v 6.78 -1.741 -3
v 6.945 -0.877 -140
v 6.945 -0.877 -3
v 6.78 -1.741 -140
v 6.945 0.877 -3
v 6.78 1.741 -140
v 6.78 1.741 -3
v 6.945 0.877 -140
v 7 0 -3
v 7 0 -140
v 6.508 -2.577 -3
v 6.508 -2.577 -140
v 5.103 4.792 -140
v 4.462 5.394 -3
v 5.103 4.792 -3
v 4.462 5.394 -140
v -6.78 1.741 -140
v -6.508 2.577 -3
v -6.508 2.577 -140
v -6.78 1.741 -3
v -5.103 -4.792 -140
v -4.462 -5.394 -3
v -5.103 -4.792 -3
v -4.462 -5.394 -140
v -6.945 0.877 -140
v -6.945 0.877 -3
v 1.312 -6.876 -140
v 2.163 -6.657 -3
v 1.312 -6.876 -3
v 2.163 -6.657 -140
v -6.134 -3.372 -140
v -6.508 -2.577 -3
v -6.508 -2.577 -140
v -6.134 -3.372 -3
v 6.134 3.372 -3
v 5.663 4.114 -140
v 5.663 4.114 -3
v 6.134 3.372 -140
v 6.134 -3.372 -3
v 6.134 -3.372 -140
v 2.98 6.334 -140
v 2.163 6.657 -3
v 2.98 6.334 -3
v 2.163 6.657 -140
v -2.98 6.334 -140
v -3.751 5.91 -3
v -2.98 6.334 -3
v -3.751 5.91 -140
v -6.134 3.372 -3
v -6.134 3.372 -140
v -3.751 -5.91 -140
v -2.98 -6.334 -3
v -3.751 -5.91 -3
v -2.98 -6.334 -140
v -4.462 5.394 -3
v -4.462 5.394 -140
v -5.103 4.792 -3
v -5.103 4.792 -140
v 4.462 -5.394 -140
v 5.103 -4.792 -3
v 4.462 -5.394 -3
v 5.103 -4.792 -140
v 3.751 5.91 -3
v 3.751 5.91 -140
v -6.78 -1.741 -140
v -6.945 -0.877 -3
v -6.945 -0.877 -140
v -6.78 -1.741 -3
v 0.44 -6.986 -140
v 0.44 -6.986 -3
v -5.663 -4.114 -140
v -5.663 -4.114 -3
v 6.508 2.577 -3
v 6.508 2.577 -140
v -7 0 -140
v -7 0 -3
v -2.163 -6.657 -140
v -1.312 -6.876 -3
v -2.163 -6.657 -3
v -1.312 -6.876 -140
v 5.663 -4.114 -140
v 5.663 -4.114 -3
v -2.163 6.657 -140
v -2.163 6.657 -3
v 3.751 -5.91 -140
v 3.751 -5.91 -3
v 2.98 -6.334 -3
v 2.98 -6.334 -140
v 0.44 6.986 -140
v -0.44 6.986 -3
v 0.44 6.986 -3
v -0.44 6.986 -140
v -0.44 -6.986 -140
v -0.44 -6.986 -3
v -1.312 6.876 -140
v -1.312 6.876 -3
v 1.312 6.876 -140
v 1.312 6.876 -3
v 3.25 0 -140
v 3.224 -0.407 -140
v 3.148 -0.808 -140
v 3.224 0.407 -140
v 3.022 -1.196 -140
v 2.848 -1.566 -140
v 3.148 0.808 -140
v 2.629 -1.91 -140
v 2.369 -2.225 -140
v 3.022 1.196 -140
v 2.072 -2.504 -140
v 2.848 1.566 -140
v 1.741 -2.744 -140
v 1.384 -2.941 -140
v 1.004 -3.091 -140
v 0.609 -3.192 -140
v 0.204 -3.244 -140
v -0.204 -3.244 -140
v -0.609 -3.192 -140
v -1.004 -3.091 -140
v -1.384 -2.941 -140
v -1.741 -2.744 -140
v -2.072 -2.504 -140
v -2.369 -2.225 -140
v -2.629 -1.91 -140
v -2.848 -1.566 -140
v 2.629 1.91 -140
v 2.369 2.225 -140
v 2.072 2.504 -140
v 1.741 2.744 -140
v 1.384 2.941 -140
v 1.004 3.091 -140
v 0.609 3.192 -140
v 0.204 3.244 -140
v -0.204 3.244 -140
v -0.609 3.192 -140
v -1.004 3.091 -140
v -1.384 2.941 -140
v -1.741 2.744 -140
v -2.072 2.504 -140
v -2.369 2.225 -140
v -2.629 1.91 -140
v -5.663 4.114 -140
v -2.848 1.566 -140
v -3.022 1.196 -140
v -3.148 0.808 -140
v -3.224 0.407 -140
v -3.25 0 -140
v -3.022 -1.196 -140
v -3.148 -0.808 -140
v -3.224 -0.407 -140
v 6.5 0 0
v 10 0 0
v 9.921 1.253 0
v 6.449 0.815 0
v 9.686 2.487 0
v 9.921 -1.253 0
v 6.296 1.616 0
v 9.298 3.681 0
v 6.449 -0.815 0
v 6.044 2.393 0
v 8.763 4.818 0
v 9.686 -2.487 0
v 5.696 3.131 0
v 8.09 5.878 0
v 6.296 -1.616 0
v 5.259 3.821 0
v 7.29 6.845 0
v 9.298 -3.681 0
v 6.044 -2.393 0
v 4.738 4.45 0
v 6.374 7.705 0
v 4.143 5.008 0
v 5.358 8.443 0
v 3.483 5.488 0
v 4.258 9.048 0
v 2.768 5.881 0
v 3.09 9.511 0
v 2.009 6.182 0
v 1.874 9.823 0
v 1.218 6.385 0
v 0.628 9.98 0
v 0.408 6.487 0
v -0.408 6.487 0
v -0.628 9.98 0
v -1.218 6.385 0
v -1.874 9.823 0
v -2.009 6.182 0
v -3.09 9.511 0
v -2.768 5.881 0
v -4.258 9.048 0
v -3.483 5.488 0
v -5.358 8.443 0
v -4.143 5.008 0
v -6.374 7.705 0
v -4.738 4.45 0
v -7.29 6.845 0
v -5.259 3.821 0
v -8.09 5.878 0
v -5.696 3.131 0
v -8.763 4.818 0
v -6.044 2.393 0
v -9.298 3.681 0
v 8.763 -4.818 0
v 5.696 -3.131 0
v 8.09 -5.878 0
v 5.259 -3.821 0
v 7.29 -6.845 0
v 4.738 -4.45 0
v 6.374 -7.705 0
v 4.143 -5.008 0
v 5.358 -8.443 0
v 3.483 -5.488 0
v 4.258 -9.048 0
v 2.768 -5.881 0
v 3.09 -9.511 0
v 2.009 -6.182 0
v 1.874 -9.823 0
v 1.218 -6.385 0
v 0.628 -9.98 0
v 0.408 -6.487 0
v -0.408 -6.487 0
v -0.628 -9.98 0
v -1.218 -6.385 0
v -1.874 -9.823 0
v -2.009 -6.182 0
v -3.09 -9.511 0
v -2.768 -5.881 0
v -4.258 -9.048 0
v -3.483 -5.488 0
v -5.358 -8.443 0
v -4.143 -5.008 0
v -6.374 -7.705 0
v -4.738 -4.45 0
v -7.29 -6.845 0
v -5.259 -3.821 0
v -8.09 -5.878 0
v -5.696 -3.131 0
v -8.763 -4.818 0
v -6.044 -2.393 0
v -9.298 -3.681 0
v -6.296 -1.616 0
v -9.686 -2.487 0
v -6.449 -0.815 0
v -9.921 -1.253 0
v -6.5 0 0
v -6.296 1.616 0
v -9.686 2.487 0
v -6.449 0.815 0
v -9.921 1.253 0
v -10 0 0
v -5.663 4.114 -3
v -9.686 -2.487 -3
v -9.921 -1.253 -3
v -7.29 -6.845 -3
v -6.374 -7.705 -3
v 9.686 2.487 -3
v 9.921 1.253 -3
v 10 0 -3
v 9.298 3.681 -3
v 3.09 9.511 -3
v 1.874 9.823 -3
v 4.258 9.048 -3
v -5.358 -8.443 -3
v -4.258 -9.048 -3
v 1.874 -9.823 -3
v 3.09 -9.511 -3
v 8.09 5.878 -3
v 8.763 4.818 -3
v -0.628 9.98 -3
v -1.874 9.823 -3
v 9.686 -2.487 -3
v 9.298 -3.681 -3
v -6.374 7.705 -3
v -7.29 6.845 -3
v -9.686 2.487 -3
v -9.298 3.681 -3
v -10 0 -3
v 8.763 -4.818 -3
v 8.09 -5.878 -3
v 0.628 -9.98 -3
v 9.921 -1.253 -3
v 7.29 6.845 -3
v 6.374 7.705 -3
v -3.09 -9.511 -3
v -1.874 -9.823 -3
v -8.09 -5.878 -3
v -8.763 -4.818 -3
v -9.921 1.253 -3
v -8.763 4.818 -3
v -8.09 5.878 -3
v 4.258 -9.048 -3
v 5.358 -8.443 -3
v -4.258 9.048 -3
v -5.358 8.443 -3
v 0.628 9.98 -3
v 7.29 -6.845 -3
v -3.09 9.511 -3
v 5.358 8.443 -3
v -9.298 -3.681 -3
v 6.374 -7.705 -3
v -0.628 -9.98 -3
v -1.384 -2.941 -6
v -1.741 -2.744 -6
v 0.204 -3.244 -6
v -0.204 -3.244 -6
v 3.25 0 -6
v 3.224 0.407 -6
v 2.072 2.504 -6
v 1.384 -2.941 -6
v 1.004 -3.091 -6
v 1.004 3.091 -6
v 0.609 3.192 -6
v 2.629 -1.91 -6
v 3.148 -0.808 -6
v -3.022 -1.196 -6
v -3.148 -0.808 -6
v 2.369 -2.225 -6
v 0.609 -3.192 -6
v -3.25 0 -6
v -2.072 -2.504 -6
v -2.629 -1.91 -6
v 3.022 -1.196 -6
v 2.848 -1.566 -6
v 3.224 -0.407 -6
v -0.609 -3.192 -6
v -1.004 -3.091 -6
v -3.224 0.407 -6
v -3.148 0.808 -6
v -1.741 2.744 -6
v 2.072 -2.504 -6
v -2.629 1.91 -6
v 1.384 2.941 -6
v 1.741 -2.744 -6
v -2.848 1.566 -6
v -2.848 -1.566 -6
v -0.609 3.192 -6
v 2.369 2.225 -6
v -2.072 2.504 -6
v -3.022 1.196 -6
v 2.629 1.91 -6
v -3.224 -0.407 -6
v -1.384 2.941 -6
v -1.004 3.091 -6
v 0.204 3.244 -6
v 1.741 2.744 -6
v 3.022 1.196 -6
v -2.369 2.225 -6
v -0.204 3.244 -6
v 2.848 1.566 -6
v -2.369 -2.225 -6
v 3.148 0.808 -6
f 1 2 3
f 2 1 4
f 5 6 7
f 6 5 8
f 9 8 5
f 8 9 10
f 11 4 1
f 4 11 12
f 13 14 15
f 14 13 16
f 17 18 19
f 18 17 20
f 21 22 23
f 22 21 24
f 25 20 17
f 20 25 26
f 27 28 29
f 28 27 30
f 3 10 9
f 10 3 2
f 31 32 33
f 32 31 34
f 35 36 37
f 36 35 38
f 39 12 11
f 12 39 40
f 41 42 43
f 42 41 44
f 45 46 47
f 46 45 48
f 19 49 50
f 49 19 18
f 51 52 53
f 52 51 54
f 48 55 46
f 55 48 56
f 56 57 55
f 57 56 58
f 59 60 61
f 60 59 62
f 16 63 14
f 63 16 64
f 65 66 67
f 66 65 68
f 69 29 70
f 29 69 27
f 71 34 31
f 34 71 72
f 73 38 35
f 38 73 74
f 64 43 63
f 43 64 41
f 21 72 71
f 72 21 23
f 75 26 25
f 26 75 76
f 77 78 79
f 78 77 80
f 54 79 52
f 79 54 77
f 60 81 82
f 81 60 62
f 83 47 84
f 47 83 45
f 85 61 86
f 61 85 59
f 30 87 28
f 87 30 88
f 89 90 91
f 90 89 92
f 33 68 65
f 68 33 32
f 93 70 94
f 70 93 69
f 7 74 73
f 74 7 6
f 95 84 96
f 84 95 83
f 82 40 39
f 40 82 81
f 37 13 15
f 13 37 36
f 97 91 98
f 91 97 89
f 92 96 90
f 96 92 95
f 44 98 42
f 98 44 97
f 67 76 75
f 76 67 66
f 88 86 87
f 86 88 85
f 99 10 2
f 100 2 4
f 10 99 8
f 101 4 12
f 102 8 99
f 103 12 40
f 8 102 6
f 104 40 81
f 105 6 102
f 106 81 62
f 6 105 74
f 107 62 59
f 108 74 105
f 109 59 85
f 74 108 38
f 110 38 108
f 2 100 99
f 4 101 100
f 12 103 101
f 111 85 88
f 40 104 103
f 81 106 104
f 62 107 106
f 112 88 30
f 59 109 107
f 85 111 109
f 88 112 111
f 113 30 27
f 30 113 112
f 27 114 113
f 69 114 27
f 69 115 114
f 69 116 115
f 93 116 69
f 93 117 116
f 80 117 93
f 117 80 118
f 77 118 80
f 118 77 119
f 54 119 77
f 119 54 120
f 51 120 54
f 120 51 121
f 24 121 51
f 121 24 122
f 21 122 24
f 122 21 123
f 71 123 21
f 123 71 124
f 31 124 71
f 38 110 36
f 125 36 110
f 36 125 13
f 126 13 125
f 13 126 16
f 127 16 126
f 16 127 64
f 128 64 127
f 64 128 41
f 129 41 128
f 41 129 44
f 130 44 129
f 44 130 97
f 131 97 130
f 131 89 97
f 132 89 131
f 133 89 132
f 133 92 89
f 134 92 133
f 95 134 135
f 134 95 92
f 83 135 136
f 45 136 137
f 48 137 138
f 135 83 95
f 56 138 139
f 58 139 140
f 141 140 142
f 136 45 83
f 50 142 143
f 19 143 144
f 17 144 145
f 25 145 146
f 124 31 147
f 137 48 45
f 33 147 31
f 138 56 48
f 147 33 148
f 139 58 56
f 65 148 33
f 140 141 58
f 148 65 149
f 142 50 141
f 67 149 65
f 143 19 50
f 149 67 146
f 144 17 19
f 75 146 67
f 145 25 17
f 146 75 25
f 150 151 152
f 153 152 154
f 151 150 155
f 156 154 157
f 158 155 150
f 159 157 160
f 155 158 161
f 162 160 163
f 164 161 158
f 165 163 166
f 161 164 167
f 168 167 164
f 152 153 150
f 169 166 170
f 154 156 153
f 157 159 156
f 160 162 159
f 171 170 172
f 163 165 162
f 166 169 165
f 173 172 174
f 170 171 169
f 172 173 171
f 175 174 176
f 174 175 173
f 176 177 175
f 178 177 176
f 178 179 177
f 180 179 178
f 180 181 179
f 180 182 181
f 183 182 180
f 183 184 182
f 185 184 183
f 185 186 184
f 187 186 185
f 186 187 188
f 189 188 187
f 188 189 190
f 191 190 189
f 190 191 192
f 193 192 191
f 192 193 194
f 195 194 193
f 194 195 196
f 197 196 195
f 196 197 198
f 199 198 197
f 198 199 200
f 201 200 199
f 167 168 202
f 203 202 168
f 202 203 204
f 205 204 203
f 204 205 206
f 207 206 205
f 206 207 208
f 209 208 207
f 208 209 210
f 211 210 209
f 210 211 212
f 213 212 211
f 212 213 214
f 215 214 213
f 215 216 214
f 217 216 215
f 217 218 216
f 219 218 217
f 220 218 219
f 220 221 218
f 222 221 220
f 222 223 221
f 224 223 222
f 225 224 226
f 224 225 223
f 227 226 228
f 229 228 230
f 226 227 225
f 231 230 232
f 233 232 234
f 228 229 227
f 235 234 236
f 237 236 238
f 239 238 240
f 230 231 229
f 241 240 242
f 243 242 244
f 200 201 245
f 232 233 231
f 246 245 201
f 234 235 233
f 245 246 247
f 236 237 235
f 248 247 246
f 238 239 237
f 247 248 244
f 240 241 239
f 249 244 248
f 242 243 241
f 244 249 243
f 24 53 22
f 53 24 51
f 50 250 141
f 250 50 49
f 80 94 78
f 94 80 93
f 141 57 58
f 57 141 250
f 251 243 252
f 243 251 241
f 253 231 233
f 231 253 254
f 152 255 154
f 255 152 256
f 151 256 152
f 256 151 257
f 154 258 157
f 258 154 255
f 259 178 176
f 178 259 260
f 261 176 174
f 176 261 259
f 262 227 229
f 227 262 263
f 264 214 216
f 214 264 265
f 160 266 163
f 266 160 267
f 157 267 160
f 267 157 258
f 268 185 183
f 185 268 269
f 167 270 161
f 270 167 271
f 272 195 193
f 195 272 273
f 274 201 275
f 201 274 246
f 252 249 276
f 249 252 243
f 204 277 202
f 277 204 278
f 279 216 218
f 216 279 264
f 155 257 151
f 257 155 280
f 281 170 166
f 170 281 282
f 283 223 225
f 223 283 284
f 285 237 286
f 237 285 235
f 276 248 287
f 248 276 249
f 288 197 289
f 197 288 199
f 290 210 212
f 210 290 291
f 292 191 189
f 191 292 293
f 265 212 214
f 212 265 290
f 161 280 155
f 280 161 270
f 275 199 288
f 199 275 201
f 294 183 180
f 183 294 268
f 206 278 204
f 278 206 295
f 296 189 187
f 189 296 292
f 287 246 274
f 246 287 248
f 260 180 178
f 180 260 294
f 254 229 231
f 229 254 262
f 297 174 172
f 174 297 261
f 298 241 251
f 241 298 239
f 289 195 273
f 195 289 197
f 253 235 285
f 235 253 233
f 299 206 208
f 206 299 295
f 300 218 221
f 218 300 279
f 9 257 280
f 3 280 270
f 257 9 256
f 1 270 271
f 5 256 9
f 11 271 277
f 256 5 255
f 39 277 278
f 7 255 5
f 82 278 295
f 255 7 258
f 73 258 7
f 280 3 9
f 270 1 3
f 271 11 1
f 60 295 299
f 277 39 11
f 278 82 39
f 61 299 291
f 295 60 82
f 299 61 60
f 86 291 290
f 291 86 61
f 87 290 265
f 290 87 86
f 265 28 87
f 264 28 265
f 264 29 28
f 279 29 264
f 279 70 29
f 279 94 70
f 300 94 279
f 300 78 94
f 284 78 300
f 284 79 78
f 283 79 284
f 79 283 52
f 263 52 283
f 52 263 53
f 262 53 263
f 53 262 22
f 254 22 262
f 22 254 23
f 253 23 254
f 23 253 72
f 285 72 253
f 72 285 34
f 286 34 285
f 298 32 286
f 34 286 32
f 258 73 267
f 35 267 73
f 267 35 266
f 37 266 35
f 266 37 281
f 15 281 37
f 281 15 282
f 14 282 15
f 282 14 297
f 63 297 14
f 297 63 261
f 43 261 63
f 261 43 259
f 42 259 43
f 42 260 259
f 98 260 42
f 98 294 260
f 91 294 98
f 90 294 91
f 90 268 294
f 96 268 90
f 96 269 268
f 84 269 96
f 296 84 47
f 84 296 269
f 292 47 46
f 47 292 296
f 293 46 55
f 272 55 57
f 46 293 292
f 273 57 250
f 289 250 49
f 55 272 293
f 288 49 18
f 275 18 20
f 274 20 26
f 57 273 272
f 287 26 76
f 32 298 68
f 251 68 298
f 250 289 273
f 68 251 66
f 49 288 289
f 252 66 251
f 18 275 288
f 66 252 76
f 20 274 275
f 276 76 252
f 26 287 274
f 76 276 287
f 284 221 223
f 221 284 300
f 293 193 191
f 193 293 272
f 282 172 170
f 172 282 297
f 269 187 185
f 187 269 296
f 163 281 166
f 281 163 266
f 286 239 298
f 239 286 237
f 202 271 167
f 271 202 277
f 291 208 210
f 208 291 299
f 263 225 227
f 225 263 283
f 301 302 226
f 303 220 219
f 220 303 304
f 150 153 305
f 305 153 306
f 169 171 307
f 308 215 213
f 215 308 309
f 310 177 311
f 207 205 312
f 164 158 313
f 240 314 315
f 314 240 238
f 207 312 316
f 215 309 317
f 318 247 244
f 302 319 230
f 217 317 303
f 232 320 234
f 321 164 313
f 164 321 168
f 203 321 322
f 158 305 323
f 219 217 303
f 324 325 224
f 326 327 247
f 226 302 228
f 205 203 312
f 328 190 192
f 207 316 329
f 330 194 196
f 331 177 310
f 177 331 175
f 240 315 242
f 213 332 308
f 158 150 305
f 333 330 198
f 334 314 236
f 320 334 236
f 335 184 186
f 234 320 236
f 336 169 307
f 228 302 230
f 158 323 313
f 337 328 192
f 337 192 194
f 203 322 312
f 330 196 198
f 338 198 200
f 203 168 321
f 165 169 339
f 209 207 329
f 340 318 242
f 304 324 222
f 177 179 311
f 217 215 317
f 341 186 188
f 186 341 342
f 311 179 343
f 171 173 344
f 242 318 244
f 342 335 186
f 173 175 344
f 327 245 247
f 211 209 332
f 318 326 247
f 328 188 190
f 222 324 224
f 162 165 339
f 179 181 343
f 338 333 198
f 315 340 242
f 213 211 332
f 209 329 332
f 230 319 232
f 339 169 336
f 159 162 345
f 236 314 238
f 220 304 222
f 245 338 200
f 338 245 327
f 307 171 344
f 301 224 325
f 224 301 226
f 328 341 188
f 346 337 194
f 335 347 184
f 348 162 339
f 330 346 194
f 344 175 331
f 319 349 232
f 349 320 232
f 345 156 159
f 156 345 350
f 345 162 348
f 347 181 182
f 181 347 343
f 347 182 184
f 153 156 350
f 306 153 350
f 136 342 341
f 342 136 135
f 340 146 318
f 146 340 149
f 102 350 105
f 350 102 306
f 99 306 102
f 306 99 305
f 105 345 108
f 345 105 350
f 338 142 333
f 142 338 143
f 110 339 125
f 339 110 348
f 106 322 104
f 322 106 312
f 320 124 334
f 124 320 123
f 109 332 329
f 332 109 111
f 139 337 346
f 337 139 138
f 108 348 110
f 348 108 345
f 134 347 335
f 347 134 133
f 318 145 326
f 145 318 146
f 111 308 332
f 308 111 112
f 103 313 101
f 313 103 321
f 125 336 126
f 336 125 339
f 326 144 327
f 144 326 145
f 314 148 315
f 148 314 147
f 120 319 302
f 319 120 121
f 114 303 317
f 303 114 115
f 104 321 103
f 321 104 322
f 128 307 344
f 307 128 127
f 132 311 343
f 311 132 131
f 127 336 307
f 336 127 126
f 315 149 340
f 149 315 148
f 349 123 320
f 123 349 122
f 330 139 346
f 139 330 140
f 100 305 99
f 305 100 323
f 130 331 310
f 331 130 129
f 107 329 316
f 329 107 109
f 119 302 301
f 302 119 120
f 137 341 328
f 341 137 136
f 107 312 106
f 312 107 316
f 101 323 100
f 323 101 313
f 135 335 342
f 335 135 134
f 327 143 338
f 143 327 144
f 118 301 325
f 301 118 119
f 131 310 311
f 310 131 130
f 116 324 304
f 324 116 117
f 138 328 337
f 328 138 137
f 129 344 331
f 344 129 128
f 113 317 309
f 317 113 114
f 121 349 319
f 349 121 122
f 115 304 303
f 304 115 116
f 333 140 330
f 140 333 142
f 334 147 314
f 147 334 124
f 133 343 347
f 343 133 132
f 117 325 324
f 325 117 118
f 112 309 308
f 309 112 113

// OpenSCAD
$fn = 50;


difference() {
	union() {
		translate(v = [0, 0, -140.0000000000]) {
			cylinder(h = 140, r = 7.0000000000);
		}
		translate(v = [0, 0, -3.0000000000]) {
			cylinder(h = 3, r = 10.0000000000);
		}
	}
	union() {
		translate(v = [0, 0, 0]) {
			rotate(a = [0, 0, 0]) {
				difference() {
					union() {
						#translate(v = [0, 0, -140.0000000000]) {
							cylinder(h = 140, r = 2.2500000000);
						}
						#translate(v = [0, 0, -6]) {
							cylinder(h = 6, r = 7.0000000000, r1 = 3.2500000000, r2 = 6.5000000000);
						}
						#translate(v = [0, 0, -140.0000000000]) {
							cylinder(h = 140, r = 3.2500000000);
						}
						#translate(v = [0, 0, -140.0000000000]) {
							cylinder(h = 140, r = 2.2500000000);
						}
					}
					union();
				}
			}
		}
	}
}
